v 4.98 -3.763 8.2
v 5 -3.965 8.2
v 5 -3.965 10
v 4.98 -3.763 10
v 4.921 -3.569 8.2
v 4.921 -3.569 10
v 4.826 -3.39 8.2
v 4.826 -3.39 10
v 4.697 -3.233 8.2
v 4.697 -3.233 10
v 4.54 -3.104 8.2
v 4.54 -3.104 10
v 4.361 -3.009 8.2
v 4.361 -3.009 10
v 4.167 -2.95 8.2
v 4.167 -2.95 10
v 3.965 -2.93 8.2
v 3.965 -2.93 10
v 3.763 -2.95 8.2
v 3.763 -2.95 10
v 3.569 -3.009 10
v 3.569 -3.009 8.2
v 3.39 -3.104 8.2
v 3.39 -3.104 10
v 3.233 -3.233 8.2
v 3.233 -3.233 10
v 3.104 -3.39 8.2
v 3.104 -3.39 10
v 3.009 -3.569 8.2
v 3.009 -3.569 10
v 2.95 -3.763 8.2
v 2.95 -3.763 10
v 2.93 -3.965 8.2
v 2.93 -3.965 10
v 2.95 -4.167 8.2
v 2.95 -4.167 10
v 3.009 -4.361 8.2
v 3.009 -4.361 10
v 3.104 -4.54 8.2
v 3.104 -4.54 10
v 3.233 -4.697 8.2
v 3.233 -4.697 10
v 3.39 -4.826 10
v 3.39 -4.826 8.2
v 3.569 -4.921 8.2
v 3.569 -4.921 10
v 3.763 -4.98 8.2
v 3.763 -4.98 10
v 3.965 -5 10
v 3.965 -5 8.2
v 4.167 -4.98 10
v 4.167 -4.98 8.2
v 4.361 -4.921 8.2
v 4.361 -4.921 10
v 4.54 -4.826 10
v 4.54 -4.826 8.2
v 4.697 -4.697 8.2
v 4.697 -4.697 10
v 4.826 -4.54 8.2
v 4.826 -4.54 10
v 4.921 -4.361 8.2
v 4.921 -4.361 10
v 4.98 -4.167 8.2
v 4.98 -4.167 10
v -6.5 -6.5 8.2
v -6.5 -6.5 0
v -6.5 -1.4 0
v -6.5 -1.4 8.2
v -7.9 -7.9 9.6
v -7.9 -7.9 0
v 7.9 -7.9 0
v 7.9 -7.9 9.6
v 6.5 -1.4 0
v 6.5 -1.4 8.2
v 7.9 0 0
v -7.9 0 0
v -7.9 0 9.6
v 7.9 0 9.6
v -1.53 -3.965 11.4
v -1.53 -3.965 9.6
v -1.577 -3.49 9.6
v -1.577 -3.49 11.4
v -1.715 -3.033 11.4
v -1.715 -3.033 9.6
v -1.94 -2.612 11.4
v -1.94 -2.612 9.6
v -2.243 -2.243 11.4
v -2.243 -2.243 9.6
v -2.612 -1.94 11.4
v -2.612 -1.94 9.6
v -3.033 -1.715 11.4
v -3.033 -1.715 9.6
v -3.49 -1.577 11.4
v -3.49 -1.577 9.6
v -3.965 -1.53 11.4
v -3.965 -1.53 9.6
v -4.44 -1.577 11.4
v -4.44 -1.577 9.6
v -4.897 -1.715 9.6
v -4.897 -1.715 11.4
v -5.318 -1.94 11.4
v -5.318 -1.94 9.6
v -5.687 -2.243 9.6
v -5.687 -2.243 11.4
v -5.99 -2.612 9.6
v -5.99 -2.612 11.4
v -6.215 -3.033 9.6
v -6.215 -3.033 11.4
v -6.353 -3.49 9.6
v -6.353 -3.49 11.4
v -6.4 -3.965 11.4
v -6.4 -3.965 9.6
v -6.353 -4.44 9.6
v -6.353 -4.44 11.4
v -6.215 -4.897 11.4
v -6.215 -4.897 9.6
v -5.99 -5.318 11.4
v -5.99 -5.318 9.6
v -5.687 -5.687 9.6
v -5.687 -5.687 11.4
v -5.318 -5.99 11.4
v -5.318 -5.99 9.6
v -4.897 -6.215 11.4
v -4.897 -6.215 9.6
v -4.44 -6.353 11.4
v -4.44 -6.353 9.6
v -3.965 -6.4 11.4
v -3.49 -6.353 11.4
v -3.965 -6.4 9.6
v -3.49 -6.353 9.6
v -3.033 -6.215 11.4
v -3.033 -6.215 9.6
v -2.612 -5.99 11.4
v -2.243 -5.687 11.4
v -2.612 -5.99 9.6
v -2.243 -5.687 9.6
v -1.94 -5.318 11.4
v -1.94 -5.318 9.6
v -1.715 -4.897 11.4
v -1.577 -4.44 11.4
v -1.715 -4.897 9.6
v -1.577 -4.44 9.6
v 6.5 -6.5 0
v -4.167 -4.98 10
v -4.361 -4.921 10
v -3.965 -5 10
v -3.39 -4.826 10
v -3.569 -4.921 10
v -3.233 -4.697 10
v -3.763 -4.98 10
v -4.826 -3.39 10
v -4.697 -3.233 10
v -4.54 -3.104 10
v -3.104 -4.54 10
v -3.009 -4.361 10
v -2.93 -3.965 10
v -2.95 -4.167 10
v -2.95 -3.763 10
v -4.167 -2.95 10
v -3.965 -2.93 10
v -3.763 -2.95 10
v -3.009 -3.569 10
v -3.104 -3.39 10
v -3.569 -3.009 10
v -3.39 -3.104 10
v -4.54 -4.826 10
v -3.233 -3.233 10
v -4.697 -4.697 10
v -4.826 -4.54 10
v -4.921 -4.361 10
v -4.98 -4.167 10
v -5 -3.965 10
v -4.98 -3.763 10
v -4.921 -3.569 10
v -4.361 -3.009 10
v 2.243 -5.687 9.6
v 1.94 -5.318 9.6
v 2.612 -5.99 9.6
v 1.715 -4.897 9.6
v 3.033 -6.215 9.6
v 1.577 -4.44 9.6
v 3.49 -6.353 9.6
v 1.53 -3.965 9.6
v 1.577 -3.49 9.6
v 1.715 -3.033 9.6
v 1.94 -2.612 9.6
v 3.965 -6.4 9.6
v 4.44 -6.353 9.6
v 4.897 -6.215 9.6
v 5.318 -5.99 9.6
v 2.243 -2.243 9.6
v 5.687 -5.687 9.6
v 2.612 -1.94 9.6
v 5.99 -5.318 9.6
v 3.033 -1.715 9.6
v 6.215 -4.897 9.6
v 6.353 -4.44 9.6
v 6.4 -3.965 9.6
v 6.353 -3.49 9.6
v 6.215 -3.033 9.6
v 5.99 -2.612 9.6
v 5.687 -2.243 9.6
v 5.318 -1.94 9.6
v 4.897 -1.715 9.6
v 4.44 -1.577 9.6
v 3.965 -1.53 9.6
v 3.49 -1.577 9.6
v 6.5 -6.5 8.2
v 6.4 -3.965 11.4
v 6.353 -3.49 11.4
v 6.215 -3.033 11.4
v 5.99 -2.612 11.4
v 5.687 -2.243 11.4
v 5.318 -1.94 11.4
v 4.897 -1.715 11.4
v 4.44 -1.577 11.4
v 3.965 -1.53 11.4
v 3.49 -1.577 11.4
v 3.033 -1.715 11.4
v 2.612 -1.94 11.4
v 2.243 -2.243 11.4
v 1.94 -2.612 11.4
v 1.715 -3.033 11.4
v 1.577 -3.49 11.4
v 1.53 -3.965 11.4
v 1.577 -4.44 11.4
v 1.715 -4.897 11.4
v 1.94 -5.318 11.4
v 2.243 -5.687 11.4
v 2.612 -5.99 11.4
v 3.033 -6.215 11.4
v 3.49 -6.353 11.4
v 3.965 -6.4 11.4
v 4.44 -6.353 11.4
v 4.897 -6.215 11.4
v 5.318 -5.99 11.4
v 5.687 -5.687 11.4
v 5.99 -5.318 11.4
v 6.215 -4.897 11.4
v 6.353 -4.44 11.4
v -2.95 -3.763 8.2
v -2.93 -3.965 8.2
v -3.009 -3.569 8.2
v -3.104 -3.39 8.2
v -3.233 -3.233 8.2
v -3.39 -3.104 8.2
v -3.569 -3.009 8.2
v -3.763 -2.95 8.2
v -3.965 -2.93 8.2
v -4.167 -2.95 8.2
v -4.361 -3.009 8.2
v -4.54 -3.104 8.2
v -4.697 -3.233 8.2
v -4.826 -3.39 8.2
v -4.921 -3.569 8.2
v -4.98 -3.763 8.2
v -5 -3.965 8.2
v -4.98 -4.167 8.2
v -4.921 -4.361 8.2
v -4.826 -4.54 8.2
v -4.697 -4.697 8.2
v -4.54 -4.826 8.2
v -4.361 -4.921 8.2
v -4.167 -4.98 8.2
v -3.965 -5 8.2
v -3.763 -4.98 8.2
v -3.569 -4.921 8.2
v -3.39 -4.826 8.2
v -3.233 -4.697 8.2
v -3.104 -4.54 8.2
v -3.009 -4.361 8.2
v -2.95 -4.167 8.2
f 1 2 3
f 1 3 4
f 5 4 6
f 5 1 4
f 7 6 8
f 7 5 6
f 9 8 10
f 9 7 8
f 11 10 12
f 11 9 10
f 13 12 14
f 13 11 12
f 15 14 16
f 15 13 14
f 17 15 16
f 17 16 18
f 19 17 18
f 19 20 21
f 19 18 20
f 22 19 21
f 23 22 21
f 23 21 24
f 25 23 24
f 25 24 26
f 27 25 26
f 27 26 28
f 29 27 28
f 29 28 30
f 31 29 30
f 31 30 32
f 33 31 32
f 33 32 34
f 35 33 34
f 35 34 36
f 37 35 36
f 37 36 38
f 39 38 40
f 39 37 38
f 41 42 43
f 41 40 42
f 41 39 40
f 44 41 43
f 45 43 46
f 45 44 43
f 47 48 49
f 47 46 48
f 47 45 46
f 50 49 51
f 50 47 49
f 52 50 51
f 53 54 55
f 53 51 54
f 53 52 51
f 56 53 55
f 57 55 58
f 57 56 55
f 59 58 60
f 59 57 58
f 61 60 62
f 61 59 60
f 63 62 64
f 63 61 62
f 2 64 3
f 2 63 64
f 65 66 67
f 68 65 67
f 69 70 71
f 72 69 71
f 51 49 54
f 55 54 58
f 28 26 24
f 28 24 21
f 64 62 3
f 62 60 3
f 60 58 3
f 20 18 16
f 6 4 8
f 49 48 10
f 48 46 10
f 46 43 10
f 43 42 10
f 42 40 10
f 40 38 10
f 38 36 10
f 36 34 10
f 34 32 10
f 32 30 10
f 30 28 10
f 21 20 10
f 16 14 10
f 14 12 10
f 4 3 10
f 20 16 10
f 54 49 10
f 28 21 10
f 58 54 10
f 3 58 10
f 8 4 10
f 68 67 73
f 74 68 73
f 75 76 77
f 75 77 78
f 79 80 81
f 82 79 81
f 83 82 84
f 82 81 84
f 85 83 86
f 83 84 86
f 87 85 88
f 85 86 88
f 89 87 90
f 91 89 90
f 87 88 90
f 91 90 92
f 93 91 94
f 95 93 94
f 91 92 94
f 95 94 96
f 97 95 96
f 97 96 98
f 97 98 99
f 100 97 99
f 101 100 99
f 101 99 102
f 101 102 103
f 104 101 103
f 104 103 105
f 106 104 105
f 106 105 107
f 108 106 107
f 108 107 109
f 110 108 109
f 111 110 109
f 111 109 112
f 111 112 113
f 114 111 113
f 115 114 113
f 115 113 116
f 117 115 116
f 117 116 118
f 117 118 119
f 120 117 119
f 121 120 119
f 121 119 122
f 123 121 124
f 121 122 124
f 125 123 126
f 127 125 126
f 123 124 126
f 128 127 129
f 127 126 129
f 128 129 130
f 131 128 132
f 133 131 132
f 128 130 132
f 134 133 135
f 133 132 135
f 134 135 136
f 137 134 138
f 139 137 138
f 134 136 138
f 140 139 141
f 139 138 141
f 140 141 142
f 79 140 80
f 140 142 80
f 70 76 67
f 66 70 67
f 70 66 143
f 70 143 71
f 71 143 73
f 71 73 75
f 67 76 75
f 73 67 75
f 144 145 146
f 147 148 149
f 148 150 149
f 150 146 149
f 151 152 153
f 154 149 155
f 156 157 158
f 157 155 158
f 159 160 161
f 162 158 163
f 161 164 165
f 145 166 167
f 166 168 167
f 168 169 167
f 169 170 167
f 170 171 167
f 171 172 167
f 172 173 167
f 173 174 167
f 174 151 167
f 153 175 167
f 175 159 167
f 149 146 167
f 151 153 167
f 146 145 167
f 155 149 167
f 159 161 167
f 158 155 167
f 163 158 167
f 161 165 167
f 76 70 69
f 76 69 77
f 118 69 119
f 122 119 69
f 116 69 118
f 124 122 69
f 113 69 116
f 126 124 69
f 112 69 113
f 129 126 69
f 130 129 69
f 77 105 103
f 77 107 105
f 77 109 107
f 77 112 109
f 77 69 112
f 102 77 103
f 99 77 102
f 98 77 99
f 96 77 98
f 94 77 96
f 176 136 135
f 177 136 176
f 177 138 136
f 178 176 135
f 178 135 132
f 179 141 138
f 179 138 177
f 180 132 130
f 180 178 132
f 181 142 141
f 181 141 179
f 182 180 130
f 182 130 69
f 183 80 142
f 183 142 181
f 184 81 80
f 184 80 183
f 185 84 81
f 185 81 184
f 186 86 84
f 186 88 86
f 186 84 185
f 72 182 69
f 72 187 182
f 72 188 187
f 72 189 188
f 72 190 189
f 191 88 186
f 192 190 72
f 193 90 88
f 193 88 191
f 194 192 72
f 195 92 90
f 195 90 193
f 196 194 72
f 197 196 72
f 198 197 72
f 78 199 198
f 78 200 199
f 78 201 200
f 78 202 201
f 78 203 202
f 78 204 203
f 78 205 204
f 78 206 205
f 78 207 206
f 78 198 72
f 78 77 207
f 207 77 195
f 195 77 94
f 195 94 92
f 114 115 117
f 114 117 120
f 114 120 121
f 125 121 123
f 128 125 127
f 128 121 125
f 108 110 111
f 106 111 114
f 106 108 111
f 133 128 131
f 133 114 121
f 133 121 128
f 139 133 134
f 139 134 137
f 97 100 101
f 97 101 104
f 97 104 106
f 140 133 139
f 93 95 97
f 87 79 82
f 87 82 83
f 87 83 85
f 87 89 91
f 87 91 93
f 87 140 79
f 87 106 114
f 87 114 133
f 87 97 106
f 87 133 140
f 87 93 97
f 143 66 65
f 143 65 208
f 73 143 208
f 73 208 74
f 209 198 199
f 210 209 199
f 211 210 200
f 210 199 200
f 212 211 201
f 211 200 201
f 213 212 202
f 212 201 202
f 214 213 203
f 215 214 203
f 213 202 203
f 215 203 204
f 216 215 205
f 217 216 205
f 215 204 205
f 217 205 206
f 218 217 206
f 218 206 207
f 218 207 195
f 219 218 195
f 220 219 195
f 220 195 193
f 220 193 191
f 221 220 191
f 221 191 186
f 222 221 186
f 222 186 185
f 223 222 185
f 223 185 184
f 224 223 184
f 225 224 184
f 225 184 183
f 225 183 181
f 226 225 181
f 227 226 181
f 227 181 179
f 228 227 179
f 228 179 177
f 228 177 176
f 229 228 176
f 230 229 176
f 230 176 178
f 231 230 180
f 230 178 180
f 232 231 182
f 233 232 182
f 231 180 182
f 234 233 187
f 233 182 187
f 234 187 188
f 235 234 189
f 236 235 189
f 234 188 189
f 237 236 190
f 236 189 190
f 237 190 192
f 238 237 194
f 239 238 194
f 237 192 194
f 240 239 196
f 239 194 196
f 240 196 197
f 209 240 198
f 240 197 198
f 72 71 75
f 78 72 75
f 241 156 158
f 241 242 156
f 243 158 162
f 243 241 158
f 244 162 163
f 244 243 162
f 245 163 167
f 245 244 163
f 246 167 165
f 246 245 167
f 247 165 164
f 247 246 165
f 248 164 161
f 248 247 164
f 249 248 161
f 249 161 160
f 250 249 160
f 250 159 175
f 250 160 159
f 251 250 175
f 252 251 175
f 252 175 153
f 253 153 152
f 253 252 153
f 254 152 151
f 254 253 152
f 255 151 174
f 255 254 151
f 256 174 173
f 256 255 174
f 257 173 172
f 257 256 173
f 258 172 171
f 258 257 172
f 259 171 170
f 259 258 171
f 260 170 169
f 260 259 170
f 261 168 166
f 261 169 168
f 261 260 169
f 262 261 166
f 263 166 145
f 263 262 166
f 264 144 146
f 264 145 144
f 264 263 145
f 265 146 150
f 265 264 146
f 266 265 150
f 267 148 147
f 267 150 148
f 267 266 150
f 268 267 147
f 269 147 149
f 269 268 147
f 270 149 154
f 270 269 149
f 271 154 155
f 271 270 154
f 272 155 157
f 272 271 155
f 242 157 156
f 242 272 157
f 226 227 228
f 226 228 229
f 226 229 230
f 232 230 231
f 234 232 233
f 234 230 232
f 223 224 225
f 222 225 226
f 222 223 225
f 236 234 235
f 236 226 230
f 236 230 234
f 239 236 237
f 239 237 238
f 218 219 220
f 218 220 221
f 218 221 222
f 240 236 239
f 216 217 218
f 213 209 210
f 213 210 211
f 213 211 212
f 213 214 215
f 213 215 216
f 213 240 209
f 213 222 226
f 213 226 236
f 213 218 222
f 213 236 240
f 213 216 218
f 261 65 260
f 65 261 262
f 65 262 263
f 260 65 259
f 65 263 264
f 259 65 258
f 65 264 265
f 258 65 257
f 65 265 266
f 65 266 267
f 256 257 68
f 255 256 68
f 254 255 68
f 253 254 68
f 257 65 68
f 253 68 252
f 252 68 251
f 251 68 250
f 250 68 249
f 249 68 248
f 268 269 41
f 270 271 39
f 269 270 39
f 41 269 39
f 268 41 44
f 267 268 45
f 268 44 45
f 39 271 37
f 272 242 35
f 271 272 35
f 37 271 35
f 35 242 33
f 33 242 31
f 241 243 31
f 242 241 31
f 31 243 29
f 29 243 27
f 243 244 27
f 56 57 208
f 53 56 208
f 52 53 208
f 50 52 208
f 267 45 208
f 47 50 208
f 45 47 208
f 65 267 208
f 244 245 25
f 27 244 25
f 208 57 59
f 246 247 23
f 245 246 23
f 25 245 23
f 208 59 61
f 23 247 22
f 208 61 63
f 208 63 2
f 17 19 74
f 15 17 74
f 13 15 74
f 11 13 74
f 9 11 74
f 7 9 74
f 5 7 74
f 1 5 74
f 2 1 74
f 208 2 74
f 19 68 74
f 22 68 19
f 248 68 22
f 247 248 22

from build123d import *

# Parameters (mm, degrees)
F0_W     = 15.8
F0_H     = 7.9
F0_R     = 2.435
F1_DEPTH = 9.6
F2_DEPTH = 11.4
F3_T     = -1.4


# Not quite as in the source:
# - a feature names something its author has since deleted; it is built from what else it names


with BuildPart() as f1:
    # F0 (on Top) → F1 (new body)
    with BuildSketch(Plane.XY):
        with Locations((0, -3.95)):
            Rectangle(F0_W, F0_H)
        with Locations((-3.965, -3.965)):
            Circle(F0_R, mode=Mode.SUBTRACT)
        with Locations((3.965, -3.965)):
            Circle(F0_R, mode=Mode.SUBTRACT)
    extrude(amount=F1_DEPTH)

    # F0 (on Top) → F2 (join)
    with BuildSketch(Plane.XY):
        with Locations((3.965, -3.965)):
            Circle(F0_R)
        with Locations((-3.965, -3.965)):
            Circle(F0_R)
    extrude(amount=F2_DEPTH)

    # F3
    f3_openings = [f1.faces().sort_by_distance(p)[0] for p in [
        (0, -3.95, 0),
    ]]
    offset(amount=F3_T, openings=f3_openings, kind=Kind.INTERSECTION)


solid = f1.part
